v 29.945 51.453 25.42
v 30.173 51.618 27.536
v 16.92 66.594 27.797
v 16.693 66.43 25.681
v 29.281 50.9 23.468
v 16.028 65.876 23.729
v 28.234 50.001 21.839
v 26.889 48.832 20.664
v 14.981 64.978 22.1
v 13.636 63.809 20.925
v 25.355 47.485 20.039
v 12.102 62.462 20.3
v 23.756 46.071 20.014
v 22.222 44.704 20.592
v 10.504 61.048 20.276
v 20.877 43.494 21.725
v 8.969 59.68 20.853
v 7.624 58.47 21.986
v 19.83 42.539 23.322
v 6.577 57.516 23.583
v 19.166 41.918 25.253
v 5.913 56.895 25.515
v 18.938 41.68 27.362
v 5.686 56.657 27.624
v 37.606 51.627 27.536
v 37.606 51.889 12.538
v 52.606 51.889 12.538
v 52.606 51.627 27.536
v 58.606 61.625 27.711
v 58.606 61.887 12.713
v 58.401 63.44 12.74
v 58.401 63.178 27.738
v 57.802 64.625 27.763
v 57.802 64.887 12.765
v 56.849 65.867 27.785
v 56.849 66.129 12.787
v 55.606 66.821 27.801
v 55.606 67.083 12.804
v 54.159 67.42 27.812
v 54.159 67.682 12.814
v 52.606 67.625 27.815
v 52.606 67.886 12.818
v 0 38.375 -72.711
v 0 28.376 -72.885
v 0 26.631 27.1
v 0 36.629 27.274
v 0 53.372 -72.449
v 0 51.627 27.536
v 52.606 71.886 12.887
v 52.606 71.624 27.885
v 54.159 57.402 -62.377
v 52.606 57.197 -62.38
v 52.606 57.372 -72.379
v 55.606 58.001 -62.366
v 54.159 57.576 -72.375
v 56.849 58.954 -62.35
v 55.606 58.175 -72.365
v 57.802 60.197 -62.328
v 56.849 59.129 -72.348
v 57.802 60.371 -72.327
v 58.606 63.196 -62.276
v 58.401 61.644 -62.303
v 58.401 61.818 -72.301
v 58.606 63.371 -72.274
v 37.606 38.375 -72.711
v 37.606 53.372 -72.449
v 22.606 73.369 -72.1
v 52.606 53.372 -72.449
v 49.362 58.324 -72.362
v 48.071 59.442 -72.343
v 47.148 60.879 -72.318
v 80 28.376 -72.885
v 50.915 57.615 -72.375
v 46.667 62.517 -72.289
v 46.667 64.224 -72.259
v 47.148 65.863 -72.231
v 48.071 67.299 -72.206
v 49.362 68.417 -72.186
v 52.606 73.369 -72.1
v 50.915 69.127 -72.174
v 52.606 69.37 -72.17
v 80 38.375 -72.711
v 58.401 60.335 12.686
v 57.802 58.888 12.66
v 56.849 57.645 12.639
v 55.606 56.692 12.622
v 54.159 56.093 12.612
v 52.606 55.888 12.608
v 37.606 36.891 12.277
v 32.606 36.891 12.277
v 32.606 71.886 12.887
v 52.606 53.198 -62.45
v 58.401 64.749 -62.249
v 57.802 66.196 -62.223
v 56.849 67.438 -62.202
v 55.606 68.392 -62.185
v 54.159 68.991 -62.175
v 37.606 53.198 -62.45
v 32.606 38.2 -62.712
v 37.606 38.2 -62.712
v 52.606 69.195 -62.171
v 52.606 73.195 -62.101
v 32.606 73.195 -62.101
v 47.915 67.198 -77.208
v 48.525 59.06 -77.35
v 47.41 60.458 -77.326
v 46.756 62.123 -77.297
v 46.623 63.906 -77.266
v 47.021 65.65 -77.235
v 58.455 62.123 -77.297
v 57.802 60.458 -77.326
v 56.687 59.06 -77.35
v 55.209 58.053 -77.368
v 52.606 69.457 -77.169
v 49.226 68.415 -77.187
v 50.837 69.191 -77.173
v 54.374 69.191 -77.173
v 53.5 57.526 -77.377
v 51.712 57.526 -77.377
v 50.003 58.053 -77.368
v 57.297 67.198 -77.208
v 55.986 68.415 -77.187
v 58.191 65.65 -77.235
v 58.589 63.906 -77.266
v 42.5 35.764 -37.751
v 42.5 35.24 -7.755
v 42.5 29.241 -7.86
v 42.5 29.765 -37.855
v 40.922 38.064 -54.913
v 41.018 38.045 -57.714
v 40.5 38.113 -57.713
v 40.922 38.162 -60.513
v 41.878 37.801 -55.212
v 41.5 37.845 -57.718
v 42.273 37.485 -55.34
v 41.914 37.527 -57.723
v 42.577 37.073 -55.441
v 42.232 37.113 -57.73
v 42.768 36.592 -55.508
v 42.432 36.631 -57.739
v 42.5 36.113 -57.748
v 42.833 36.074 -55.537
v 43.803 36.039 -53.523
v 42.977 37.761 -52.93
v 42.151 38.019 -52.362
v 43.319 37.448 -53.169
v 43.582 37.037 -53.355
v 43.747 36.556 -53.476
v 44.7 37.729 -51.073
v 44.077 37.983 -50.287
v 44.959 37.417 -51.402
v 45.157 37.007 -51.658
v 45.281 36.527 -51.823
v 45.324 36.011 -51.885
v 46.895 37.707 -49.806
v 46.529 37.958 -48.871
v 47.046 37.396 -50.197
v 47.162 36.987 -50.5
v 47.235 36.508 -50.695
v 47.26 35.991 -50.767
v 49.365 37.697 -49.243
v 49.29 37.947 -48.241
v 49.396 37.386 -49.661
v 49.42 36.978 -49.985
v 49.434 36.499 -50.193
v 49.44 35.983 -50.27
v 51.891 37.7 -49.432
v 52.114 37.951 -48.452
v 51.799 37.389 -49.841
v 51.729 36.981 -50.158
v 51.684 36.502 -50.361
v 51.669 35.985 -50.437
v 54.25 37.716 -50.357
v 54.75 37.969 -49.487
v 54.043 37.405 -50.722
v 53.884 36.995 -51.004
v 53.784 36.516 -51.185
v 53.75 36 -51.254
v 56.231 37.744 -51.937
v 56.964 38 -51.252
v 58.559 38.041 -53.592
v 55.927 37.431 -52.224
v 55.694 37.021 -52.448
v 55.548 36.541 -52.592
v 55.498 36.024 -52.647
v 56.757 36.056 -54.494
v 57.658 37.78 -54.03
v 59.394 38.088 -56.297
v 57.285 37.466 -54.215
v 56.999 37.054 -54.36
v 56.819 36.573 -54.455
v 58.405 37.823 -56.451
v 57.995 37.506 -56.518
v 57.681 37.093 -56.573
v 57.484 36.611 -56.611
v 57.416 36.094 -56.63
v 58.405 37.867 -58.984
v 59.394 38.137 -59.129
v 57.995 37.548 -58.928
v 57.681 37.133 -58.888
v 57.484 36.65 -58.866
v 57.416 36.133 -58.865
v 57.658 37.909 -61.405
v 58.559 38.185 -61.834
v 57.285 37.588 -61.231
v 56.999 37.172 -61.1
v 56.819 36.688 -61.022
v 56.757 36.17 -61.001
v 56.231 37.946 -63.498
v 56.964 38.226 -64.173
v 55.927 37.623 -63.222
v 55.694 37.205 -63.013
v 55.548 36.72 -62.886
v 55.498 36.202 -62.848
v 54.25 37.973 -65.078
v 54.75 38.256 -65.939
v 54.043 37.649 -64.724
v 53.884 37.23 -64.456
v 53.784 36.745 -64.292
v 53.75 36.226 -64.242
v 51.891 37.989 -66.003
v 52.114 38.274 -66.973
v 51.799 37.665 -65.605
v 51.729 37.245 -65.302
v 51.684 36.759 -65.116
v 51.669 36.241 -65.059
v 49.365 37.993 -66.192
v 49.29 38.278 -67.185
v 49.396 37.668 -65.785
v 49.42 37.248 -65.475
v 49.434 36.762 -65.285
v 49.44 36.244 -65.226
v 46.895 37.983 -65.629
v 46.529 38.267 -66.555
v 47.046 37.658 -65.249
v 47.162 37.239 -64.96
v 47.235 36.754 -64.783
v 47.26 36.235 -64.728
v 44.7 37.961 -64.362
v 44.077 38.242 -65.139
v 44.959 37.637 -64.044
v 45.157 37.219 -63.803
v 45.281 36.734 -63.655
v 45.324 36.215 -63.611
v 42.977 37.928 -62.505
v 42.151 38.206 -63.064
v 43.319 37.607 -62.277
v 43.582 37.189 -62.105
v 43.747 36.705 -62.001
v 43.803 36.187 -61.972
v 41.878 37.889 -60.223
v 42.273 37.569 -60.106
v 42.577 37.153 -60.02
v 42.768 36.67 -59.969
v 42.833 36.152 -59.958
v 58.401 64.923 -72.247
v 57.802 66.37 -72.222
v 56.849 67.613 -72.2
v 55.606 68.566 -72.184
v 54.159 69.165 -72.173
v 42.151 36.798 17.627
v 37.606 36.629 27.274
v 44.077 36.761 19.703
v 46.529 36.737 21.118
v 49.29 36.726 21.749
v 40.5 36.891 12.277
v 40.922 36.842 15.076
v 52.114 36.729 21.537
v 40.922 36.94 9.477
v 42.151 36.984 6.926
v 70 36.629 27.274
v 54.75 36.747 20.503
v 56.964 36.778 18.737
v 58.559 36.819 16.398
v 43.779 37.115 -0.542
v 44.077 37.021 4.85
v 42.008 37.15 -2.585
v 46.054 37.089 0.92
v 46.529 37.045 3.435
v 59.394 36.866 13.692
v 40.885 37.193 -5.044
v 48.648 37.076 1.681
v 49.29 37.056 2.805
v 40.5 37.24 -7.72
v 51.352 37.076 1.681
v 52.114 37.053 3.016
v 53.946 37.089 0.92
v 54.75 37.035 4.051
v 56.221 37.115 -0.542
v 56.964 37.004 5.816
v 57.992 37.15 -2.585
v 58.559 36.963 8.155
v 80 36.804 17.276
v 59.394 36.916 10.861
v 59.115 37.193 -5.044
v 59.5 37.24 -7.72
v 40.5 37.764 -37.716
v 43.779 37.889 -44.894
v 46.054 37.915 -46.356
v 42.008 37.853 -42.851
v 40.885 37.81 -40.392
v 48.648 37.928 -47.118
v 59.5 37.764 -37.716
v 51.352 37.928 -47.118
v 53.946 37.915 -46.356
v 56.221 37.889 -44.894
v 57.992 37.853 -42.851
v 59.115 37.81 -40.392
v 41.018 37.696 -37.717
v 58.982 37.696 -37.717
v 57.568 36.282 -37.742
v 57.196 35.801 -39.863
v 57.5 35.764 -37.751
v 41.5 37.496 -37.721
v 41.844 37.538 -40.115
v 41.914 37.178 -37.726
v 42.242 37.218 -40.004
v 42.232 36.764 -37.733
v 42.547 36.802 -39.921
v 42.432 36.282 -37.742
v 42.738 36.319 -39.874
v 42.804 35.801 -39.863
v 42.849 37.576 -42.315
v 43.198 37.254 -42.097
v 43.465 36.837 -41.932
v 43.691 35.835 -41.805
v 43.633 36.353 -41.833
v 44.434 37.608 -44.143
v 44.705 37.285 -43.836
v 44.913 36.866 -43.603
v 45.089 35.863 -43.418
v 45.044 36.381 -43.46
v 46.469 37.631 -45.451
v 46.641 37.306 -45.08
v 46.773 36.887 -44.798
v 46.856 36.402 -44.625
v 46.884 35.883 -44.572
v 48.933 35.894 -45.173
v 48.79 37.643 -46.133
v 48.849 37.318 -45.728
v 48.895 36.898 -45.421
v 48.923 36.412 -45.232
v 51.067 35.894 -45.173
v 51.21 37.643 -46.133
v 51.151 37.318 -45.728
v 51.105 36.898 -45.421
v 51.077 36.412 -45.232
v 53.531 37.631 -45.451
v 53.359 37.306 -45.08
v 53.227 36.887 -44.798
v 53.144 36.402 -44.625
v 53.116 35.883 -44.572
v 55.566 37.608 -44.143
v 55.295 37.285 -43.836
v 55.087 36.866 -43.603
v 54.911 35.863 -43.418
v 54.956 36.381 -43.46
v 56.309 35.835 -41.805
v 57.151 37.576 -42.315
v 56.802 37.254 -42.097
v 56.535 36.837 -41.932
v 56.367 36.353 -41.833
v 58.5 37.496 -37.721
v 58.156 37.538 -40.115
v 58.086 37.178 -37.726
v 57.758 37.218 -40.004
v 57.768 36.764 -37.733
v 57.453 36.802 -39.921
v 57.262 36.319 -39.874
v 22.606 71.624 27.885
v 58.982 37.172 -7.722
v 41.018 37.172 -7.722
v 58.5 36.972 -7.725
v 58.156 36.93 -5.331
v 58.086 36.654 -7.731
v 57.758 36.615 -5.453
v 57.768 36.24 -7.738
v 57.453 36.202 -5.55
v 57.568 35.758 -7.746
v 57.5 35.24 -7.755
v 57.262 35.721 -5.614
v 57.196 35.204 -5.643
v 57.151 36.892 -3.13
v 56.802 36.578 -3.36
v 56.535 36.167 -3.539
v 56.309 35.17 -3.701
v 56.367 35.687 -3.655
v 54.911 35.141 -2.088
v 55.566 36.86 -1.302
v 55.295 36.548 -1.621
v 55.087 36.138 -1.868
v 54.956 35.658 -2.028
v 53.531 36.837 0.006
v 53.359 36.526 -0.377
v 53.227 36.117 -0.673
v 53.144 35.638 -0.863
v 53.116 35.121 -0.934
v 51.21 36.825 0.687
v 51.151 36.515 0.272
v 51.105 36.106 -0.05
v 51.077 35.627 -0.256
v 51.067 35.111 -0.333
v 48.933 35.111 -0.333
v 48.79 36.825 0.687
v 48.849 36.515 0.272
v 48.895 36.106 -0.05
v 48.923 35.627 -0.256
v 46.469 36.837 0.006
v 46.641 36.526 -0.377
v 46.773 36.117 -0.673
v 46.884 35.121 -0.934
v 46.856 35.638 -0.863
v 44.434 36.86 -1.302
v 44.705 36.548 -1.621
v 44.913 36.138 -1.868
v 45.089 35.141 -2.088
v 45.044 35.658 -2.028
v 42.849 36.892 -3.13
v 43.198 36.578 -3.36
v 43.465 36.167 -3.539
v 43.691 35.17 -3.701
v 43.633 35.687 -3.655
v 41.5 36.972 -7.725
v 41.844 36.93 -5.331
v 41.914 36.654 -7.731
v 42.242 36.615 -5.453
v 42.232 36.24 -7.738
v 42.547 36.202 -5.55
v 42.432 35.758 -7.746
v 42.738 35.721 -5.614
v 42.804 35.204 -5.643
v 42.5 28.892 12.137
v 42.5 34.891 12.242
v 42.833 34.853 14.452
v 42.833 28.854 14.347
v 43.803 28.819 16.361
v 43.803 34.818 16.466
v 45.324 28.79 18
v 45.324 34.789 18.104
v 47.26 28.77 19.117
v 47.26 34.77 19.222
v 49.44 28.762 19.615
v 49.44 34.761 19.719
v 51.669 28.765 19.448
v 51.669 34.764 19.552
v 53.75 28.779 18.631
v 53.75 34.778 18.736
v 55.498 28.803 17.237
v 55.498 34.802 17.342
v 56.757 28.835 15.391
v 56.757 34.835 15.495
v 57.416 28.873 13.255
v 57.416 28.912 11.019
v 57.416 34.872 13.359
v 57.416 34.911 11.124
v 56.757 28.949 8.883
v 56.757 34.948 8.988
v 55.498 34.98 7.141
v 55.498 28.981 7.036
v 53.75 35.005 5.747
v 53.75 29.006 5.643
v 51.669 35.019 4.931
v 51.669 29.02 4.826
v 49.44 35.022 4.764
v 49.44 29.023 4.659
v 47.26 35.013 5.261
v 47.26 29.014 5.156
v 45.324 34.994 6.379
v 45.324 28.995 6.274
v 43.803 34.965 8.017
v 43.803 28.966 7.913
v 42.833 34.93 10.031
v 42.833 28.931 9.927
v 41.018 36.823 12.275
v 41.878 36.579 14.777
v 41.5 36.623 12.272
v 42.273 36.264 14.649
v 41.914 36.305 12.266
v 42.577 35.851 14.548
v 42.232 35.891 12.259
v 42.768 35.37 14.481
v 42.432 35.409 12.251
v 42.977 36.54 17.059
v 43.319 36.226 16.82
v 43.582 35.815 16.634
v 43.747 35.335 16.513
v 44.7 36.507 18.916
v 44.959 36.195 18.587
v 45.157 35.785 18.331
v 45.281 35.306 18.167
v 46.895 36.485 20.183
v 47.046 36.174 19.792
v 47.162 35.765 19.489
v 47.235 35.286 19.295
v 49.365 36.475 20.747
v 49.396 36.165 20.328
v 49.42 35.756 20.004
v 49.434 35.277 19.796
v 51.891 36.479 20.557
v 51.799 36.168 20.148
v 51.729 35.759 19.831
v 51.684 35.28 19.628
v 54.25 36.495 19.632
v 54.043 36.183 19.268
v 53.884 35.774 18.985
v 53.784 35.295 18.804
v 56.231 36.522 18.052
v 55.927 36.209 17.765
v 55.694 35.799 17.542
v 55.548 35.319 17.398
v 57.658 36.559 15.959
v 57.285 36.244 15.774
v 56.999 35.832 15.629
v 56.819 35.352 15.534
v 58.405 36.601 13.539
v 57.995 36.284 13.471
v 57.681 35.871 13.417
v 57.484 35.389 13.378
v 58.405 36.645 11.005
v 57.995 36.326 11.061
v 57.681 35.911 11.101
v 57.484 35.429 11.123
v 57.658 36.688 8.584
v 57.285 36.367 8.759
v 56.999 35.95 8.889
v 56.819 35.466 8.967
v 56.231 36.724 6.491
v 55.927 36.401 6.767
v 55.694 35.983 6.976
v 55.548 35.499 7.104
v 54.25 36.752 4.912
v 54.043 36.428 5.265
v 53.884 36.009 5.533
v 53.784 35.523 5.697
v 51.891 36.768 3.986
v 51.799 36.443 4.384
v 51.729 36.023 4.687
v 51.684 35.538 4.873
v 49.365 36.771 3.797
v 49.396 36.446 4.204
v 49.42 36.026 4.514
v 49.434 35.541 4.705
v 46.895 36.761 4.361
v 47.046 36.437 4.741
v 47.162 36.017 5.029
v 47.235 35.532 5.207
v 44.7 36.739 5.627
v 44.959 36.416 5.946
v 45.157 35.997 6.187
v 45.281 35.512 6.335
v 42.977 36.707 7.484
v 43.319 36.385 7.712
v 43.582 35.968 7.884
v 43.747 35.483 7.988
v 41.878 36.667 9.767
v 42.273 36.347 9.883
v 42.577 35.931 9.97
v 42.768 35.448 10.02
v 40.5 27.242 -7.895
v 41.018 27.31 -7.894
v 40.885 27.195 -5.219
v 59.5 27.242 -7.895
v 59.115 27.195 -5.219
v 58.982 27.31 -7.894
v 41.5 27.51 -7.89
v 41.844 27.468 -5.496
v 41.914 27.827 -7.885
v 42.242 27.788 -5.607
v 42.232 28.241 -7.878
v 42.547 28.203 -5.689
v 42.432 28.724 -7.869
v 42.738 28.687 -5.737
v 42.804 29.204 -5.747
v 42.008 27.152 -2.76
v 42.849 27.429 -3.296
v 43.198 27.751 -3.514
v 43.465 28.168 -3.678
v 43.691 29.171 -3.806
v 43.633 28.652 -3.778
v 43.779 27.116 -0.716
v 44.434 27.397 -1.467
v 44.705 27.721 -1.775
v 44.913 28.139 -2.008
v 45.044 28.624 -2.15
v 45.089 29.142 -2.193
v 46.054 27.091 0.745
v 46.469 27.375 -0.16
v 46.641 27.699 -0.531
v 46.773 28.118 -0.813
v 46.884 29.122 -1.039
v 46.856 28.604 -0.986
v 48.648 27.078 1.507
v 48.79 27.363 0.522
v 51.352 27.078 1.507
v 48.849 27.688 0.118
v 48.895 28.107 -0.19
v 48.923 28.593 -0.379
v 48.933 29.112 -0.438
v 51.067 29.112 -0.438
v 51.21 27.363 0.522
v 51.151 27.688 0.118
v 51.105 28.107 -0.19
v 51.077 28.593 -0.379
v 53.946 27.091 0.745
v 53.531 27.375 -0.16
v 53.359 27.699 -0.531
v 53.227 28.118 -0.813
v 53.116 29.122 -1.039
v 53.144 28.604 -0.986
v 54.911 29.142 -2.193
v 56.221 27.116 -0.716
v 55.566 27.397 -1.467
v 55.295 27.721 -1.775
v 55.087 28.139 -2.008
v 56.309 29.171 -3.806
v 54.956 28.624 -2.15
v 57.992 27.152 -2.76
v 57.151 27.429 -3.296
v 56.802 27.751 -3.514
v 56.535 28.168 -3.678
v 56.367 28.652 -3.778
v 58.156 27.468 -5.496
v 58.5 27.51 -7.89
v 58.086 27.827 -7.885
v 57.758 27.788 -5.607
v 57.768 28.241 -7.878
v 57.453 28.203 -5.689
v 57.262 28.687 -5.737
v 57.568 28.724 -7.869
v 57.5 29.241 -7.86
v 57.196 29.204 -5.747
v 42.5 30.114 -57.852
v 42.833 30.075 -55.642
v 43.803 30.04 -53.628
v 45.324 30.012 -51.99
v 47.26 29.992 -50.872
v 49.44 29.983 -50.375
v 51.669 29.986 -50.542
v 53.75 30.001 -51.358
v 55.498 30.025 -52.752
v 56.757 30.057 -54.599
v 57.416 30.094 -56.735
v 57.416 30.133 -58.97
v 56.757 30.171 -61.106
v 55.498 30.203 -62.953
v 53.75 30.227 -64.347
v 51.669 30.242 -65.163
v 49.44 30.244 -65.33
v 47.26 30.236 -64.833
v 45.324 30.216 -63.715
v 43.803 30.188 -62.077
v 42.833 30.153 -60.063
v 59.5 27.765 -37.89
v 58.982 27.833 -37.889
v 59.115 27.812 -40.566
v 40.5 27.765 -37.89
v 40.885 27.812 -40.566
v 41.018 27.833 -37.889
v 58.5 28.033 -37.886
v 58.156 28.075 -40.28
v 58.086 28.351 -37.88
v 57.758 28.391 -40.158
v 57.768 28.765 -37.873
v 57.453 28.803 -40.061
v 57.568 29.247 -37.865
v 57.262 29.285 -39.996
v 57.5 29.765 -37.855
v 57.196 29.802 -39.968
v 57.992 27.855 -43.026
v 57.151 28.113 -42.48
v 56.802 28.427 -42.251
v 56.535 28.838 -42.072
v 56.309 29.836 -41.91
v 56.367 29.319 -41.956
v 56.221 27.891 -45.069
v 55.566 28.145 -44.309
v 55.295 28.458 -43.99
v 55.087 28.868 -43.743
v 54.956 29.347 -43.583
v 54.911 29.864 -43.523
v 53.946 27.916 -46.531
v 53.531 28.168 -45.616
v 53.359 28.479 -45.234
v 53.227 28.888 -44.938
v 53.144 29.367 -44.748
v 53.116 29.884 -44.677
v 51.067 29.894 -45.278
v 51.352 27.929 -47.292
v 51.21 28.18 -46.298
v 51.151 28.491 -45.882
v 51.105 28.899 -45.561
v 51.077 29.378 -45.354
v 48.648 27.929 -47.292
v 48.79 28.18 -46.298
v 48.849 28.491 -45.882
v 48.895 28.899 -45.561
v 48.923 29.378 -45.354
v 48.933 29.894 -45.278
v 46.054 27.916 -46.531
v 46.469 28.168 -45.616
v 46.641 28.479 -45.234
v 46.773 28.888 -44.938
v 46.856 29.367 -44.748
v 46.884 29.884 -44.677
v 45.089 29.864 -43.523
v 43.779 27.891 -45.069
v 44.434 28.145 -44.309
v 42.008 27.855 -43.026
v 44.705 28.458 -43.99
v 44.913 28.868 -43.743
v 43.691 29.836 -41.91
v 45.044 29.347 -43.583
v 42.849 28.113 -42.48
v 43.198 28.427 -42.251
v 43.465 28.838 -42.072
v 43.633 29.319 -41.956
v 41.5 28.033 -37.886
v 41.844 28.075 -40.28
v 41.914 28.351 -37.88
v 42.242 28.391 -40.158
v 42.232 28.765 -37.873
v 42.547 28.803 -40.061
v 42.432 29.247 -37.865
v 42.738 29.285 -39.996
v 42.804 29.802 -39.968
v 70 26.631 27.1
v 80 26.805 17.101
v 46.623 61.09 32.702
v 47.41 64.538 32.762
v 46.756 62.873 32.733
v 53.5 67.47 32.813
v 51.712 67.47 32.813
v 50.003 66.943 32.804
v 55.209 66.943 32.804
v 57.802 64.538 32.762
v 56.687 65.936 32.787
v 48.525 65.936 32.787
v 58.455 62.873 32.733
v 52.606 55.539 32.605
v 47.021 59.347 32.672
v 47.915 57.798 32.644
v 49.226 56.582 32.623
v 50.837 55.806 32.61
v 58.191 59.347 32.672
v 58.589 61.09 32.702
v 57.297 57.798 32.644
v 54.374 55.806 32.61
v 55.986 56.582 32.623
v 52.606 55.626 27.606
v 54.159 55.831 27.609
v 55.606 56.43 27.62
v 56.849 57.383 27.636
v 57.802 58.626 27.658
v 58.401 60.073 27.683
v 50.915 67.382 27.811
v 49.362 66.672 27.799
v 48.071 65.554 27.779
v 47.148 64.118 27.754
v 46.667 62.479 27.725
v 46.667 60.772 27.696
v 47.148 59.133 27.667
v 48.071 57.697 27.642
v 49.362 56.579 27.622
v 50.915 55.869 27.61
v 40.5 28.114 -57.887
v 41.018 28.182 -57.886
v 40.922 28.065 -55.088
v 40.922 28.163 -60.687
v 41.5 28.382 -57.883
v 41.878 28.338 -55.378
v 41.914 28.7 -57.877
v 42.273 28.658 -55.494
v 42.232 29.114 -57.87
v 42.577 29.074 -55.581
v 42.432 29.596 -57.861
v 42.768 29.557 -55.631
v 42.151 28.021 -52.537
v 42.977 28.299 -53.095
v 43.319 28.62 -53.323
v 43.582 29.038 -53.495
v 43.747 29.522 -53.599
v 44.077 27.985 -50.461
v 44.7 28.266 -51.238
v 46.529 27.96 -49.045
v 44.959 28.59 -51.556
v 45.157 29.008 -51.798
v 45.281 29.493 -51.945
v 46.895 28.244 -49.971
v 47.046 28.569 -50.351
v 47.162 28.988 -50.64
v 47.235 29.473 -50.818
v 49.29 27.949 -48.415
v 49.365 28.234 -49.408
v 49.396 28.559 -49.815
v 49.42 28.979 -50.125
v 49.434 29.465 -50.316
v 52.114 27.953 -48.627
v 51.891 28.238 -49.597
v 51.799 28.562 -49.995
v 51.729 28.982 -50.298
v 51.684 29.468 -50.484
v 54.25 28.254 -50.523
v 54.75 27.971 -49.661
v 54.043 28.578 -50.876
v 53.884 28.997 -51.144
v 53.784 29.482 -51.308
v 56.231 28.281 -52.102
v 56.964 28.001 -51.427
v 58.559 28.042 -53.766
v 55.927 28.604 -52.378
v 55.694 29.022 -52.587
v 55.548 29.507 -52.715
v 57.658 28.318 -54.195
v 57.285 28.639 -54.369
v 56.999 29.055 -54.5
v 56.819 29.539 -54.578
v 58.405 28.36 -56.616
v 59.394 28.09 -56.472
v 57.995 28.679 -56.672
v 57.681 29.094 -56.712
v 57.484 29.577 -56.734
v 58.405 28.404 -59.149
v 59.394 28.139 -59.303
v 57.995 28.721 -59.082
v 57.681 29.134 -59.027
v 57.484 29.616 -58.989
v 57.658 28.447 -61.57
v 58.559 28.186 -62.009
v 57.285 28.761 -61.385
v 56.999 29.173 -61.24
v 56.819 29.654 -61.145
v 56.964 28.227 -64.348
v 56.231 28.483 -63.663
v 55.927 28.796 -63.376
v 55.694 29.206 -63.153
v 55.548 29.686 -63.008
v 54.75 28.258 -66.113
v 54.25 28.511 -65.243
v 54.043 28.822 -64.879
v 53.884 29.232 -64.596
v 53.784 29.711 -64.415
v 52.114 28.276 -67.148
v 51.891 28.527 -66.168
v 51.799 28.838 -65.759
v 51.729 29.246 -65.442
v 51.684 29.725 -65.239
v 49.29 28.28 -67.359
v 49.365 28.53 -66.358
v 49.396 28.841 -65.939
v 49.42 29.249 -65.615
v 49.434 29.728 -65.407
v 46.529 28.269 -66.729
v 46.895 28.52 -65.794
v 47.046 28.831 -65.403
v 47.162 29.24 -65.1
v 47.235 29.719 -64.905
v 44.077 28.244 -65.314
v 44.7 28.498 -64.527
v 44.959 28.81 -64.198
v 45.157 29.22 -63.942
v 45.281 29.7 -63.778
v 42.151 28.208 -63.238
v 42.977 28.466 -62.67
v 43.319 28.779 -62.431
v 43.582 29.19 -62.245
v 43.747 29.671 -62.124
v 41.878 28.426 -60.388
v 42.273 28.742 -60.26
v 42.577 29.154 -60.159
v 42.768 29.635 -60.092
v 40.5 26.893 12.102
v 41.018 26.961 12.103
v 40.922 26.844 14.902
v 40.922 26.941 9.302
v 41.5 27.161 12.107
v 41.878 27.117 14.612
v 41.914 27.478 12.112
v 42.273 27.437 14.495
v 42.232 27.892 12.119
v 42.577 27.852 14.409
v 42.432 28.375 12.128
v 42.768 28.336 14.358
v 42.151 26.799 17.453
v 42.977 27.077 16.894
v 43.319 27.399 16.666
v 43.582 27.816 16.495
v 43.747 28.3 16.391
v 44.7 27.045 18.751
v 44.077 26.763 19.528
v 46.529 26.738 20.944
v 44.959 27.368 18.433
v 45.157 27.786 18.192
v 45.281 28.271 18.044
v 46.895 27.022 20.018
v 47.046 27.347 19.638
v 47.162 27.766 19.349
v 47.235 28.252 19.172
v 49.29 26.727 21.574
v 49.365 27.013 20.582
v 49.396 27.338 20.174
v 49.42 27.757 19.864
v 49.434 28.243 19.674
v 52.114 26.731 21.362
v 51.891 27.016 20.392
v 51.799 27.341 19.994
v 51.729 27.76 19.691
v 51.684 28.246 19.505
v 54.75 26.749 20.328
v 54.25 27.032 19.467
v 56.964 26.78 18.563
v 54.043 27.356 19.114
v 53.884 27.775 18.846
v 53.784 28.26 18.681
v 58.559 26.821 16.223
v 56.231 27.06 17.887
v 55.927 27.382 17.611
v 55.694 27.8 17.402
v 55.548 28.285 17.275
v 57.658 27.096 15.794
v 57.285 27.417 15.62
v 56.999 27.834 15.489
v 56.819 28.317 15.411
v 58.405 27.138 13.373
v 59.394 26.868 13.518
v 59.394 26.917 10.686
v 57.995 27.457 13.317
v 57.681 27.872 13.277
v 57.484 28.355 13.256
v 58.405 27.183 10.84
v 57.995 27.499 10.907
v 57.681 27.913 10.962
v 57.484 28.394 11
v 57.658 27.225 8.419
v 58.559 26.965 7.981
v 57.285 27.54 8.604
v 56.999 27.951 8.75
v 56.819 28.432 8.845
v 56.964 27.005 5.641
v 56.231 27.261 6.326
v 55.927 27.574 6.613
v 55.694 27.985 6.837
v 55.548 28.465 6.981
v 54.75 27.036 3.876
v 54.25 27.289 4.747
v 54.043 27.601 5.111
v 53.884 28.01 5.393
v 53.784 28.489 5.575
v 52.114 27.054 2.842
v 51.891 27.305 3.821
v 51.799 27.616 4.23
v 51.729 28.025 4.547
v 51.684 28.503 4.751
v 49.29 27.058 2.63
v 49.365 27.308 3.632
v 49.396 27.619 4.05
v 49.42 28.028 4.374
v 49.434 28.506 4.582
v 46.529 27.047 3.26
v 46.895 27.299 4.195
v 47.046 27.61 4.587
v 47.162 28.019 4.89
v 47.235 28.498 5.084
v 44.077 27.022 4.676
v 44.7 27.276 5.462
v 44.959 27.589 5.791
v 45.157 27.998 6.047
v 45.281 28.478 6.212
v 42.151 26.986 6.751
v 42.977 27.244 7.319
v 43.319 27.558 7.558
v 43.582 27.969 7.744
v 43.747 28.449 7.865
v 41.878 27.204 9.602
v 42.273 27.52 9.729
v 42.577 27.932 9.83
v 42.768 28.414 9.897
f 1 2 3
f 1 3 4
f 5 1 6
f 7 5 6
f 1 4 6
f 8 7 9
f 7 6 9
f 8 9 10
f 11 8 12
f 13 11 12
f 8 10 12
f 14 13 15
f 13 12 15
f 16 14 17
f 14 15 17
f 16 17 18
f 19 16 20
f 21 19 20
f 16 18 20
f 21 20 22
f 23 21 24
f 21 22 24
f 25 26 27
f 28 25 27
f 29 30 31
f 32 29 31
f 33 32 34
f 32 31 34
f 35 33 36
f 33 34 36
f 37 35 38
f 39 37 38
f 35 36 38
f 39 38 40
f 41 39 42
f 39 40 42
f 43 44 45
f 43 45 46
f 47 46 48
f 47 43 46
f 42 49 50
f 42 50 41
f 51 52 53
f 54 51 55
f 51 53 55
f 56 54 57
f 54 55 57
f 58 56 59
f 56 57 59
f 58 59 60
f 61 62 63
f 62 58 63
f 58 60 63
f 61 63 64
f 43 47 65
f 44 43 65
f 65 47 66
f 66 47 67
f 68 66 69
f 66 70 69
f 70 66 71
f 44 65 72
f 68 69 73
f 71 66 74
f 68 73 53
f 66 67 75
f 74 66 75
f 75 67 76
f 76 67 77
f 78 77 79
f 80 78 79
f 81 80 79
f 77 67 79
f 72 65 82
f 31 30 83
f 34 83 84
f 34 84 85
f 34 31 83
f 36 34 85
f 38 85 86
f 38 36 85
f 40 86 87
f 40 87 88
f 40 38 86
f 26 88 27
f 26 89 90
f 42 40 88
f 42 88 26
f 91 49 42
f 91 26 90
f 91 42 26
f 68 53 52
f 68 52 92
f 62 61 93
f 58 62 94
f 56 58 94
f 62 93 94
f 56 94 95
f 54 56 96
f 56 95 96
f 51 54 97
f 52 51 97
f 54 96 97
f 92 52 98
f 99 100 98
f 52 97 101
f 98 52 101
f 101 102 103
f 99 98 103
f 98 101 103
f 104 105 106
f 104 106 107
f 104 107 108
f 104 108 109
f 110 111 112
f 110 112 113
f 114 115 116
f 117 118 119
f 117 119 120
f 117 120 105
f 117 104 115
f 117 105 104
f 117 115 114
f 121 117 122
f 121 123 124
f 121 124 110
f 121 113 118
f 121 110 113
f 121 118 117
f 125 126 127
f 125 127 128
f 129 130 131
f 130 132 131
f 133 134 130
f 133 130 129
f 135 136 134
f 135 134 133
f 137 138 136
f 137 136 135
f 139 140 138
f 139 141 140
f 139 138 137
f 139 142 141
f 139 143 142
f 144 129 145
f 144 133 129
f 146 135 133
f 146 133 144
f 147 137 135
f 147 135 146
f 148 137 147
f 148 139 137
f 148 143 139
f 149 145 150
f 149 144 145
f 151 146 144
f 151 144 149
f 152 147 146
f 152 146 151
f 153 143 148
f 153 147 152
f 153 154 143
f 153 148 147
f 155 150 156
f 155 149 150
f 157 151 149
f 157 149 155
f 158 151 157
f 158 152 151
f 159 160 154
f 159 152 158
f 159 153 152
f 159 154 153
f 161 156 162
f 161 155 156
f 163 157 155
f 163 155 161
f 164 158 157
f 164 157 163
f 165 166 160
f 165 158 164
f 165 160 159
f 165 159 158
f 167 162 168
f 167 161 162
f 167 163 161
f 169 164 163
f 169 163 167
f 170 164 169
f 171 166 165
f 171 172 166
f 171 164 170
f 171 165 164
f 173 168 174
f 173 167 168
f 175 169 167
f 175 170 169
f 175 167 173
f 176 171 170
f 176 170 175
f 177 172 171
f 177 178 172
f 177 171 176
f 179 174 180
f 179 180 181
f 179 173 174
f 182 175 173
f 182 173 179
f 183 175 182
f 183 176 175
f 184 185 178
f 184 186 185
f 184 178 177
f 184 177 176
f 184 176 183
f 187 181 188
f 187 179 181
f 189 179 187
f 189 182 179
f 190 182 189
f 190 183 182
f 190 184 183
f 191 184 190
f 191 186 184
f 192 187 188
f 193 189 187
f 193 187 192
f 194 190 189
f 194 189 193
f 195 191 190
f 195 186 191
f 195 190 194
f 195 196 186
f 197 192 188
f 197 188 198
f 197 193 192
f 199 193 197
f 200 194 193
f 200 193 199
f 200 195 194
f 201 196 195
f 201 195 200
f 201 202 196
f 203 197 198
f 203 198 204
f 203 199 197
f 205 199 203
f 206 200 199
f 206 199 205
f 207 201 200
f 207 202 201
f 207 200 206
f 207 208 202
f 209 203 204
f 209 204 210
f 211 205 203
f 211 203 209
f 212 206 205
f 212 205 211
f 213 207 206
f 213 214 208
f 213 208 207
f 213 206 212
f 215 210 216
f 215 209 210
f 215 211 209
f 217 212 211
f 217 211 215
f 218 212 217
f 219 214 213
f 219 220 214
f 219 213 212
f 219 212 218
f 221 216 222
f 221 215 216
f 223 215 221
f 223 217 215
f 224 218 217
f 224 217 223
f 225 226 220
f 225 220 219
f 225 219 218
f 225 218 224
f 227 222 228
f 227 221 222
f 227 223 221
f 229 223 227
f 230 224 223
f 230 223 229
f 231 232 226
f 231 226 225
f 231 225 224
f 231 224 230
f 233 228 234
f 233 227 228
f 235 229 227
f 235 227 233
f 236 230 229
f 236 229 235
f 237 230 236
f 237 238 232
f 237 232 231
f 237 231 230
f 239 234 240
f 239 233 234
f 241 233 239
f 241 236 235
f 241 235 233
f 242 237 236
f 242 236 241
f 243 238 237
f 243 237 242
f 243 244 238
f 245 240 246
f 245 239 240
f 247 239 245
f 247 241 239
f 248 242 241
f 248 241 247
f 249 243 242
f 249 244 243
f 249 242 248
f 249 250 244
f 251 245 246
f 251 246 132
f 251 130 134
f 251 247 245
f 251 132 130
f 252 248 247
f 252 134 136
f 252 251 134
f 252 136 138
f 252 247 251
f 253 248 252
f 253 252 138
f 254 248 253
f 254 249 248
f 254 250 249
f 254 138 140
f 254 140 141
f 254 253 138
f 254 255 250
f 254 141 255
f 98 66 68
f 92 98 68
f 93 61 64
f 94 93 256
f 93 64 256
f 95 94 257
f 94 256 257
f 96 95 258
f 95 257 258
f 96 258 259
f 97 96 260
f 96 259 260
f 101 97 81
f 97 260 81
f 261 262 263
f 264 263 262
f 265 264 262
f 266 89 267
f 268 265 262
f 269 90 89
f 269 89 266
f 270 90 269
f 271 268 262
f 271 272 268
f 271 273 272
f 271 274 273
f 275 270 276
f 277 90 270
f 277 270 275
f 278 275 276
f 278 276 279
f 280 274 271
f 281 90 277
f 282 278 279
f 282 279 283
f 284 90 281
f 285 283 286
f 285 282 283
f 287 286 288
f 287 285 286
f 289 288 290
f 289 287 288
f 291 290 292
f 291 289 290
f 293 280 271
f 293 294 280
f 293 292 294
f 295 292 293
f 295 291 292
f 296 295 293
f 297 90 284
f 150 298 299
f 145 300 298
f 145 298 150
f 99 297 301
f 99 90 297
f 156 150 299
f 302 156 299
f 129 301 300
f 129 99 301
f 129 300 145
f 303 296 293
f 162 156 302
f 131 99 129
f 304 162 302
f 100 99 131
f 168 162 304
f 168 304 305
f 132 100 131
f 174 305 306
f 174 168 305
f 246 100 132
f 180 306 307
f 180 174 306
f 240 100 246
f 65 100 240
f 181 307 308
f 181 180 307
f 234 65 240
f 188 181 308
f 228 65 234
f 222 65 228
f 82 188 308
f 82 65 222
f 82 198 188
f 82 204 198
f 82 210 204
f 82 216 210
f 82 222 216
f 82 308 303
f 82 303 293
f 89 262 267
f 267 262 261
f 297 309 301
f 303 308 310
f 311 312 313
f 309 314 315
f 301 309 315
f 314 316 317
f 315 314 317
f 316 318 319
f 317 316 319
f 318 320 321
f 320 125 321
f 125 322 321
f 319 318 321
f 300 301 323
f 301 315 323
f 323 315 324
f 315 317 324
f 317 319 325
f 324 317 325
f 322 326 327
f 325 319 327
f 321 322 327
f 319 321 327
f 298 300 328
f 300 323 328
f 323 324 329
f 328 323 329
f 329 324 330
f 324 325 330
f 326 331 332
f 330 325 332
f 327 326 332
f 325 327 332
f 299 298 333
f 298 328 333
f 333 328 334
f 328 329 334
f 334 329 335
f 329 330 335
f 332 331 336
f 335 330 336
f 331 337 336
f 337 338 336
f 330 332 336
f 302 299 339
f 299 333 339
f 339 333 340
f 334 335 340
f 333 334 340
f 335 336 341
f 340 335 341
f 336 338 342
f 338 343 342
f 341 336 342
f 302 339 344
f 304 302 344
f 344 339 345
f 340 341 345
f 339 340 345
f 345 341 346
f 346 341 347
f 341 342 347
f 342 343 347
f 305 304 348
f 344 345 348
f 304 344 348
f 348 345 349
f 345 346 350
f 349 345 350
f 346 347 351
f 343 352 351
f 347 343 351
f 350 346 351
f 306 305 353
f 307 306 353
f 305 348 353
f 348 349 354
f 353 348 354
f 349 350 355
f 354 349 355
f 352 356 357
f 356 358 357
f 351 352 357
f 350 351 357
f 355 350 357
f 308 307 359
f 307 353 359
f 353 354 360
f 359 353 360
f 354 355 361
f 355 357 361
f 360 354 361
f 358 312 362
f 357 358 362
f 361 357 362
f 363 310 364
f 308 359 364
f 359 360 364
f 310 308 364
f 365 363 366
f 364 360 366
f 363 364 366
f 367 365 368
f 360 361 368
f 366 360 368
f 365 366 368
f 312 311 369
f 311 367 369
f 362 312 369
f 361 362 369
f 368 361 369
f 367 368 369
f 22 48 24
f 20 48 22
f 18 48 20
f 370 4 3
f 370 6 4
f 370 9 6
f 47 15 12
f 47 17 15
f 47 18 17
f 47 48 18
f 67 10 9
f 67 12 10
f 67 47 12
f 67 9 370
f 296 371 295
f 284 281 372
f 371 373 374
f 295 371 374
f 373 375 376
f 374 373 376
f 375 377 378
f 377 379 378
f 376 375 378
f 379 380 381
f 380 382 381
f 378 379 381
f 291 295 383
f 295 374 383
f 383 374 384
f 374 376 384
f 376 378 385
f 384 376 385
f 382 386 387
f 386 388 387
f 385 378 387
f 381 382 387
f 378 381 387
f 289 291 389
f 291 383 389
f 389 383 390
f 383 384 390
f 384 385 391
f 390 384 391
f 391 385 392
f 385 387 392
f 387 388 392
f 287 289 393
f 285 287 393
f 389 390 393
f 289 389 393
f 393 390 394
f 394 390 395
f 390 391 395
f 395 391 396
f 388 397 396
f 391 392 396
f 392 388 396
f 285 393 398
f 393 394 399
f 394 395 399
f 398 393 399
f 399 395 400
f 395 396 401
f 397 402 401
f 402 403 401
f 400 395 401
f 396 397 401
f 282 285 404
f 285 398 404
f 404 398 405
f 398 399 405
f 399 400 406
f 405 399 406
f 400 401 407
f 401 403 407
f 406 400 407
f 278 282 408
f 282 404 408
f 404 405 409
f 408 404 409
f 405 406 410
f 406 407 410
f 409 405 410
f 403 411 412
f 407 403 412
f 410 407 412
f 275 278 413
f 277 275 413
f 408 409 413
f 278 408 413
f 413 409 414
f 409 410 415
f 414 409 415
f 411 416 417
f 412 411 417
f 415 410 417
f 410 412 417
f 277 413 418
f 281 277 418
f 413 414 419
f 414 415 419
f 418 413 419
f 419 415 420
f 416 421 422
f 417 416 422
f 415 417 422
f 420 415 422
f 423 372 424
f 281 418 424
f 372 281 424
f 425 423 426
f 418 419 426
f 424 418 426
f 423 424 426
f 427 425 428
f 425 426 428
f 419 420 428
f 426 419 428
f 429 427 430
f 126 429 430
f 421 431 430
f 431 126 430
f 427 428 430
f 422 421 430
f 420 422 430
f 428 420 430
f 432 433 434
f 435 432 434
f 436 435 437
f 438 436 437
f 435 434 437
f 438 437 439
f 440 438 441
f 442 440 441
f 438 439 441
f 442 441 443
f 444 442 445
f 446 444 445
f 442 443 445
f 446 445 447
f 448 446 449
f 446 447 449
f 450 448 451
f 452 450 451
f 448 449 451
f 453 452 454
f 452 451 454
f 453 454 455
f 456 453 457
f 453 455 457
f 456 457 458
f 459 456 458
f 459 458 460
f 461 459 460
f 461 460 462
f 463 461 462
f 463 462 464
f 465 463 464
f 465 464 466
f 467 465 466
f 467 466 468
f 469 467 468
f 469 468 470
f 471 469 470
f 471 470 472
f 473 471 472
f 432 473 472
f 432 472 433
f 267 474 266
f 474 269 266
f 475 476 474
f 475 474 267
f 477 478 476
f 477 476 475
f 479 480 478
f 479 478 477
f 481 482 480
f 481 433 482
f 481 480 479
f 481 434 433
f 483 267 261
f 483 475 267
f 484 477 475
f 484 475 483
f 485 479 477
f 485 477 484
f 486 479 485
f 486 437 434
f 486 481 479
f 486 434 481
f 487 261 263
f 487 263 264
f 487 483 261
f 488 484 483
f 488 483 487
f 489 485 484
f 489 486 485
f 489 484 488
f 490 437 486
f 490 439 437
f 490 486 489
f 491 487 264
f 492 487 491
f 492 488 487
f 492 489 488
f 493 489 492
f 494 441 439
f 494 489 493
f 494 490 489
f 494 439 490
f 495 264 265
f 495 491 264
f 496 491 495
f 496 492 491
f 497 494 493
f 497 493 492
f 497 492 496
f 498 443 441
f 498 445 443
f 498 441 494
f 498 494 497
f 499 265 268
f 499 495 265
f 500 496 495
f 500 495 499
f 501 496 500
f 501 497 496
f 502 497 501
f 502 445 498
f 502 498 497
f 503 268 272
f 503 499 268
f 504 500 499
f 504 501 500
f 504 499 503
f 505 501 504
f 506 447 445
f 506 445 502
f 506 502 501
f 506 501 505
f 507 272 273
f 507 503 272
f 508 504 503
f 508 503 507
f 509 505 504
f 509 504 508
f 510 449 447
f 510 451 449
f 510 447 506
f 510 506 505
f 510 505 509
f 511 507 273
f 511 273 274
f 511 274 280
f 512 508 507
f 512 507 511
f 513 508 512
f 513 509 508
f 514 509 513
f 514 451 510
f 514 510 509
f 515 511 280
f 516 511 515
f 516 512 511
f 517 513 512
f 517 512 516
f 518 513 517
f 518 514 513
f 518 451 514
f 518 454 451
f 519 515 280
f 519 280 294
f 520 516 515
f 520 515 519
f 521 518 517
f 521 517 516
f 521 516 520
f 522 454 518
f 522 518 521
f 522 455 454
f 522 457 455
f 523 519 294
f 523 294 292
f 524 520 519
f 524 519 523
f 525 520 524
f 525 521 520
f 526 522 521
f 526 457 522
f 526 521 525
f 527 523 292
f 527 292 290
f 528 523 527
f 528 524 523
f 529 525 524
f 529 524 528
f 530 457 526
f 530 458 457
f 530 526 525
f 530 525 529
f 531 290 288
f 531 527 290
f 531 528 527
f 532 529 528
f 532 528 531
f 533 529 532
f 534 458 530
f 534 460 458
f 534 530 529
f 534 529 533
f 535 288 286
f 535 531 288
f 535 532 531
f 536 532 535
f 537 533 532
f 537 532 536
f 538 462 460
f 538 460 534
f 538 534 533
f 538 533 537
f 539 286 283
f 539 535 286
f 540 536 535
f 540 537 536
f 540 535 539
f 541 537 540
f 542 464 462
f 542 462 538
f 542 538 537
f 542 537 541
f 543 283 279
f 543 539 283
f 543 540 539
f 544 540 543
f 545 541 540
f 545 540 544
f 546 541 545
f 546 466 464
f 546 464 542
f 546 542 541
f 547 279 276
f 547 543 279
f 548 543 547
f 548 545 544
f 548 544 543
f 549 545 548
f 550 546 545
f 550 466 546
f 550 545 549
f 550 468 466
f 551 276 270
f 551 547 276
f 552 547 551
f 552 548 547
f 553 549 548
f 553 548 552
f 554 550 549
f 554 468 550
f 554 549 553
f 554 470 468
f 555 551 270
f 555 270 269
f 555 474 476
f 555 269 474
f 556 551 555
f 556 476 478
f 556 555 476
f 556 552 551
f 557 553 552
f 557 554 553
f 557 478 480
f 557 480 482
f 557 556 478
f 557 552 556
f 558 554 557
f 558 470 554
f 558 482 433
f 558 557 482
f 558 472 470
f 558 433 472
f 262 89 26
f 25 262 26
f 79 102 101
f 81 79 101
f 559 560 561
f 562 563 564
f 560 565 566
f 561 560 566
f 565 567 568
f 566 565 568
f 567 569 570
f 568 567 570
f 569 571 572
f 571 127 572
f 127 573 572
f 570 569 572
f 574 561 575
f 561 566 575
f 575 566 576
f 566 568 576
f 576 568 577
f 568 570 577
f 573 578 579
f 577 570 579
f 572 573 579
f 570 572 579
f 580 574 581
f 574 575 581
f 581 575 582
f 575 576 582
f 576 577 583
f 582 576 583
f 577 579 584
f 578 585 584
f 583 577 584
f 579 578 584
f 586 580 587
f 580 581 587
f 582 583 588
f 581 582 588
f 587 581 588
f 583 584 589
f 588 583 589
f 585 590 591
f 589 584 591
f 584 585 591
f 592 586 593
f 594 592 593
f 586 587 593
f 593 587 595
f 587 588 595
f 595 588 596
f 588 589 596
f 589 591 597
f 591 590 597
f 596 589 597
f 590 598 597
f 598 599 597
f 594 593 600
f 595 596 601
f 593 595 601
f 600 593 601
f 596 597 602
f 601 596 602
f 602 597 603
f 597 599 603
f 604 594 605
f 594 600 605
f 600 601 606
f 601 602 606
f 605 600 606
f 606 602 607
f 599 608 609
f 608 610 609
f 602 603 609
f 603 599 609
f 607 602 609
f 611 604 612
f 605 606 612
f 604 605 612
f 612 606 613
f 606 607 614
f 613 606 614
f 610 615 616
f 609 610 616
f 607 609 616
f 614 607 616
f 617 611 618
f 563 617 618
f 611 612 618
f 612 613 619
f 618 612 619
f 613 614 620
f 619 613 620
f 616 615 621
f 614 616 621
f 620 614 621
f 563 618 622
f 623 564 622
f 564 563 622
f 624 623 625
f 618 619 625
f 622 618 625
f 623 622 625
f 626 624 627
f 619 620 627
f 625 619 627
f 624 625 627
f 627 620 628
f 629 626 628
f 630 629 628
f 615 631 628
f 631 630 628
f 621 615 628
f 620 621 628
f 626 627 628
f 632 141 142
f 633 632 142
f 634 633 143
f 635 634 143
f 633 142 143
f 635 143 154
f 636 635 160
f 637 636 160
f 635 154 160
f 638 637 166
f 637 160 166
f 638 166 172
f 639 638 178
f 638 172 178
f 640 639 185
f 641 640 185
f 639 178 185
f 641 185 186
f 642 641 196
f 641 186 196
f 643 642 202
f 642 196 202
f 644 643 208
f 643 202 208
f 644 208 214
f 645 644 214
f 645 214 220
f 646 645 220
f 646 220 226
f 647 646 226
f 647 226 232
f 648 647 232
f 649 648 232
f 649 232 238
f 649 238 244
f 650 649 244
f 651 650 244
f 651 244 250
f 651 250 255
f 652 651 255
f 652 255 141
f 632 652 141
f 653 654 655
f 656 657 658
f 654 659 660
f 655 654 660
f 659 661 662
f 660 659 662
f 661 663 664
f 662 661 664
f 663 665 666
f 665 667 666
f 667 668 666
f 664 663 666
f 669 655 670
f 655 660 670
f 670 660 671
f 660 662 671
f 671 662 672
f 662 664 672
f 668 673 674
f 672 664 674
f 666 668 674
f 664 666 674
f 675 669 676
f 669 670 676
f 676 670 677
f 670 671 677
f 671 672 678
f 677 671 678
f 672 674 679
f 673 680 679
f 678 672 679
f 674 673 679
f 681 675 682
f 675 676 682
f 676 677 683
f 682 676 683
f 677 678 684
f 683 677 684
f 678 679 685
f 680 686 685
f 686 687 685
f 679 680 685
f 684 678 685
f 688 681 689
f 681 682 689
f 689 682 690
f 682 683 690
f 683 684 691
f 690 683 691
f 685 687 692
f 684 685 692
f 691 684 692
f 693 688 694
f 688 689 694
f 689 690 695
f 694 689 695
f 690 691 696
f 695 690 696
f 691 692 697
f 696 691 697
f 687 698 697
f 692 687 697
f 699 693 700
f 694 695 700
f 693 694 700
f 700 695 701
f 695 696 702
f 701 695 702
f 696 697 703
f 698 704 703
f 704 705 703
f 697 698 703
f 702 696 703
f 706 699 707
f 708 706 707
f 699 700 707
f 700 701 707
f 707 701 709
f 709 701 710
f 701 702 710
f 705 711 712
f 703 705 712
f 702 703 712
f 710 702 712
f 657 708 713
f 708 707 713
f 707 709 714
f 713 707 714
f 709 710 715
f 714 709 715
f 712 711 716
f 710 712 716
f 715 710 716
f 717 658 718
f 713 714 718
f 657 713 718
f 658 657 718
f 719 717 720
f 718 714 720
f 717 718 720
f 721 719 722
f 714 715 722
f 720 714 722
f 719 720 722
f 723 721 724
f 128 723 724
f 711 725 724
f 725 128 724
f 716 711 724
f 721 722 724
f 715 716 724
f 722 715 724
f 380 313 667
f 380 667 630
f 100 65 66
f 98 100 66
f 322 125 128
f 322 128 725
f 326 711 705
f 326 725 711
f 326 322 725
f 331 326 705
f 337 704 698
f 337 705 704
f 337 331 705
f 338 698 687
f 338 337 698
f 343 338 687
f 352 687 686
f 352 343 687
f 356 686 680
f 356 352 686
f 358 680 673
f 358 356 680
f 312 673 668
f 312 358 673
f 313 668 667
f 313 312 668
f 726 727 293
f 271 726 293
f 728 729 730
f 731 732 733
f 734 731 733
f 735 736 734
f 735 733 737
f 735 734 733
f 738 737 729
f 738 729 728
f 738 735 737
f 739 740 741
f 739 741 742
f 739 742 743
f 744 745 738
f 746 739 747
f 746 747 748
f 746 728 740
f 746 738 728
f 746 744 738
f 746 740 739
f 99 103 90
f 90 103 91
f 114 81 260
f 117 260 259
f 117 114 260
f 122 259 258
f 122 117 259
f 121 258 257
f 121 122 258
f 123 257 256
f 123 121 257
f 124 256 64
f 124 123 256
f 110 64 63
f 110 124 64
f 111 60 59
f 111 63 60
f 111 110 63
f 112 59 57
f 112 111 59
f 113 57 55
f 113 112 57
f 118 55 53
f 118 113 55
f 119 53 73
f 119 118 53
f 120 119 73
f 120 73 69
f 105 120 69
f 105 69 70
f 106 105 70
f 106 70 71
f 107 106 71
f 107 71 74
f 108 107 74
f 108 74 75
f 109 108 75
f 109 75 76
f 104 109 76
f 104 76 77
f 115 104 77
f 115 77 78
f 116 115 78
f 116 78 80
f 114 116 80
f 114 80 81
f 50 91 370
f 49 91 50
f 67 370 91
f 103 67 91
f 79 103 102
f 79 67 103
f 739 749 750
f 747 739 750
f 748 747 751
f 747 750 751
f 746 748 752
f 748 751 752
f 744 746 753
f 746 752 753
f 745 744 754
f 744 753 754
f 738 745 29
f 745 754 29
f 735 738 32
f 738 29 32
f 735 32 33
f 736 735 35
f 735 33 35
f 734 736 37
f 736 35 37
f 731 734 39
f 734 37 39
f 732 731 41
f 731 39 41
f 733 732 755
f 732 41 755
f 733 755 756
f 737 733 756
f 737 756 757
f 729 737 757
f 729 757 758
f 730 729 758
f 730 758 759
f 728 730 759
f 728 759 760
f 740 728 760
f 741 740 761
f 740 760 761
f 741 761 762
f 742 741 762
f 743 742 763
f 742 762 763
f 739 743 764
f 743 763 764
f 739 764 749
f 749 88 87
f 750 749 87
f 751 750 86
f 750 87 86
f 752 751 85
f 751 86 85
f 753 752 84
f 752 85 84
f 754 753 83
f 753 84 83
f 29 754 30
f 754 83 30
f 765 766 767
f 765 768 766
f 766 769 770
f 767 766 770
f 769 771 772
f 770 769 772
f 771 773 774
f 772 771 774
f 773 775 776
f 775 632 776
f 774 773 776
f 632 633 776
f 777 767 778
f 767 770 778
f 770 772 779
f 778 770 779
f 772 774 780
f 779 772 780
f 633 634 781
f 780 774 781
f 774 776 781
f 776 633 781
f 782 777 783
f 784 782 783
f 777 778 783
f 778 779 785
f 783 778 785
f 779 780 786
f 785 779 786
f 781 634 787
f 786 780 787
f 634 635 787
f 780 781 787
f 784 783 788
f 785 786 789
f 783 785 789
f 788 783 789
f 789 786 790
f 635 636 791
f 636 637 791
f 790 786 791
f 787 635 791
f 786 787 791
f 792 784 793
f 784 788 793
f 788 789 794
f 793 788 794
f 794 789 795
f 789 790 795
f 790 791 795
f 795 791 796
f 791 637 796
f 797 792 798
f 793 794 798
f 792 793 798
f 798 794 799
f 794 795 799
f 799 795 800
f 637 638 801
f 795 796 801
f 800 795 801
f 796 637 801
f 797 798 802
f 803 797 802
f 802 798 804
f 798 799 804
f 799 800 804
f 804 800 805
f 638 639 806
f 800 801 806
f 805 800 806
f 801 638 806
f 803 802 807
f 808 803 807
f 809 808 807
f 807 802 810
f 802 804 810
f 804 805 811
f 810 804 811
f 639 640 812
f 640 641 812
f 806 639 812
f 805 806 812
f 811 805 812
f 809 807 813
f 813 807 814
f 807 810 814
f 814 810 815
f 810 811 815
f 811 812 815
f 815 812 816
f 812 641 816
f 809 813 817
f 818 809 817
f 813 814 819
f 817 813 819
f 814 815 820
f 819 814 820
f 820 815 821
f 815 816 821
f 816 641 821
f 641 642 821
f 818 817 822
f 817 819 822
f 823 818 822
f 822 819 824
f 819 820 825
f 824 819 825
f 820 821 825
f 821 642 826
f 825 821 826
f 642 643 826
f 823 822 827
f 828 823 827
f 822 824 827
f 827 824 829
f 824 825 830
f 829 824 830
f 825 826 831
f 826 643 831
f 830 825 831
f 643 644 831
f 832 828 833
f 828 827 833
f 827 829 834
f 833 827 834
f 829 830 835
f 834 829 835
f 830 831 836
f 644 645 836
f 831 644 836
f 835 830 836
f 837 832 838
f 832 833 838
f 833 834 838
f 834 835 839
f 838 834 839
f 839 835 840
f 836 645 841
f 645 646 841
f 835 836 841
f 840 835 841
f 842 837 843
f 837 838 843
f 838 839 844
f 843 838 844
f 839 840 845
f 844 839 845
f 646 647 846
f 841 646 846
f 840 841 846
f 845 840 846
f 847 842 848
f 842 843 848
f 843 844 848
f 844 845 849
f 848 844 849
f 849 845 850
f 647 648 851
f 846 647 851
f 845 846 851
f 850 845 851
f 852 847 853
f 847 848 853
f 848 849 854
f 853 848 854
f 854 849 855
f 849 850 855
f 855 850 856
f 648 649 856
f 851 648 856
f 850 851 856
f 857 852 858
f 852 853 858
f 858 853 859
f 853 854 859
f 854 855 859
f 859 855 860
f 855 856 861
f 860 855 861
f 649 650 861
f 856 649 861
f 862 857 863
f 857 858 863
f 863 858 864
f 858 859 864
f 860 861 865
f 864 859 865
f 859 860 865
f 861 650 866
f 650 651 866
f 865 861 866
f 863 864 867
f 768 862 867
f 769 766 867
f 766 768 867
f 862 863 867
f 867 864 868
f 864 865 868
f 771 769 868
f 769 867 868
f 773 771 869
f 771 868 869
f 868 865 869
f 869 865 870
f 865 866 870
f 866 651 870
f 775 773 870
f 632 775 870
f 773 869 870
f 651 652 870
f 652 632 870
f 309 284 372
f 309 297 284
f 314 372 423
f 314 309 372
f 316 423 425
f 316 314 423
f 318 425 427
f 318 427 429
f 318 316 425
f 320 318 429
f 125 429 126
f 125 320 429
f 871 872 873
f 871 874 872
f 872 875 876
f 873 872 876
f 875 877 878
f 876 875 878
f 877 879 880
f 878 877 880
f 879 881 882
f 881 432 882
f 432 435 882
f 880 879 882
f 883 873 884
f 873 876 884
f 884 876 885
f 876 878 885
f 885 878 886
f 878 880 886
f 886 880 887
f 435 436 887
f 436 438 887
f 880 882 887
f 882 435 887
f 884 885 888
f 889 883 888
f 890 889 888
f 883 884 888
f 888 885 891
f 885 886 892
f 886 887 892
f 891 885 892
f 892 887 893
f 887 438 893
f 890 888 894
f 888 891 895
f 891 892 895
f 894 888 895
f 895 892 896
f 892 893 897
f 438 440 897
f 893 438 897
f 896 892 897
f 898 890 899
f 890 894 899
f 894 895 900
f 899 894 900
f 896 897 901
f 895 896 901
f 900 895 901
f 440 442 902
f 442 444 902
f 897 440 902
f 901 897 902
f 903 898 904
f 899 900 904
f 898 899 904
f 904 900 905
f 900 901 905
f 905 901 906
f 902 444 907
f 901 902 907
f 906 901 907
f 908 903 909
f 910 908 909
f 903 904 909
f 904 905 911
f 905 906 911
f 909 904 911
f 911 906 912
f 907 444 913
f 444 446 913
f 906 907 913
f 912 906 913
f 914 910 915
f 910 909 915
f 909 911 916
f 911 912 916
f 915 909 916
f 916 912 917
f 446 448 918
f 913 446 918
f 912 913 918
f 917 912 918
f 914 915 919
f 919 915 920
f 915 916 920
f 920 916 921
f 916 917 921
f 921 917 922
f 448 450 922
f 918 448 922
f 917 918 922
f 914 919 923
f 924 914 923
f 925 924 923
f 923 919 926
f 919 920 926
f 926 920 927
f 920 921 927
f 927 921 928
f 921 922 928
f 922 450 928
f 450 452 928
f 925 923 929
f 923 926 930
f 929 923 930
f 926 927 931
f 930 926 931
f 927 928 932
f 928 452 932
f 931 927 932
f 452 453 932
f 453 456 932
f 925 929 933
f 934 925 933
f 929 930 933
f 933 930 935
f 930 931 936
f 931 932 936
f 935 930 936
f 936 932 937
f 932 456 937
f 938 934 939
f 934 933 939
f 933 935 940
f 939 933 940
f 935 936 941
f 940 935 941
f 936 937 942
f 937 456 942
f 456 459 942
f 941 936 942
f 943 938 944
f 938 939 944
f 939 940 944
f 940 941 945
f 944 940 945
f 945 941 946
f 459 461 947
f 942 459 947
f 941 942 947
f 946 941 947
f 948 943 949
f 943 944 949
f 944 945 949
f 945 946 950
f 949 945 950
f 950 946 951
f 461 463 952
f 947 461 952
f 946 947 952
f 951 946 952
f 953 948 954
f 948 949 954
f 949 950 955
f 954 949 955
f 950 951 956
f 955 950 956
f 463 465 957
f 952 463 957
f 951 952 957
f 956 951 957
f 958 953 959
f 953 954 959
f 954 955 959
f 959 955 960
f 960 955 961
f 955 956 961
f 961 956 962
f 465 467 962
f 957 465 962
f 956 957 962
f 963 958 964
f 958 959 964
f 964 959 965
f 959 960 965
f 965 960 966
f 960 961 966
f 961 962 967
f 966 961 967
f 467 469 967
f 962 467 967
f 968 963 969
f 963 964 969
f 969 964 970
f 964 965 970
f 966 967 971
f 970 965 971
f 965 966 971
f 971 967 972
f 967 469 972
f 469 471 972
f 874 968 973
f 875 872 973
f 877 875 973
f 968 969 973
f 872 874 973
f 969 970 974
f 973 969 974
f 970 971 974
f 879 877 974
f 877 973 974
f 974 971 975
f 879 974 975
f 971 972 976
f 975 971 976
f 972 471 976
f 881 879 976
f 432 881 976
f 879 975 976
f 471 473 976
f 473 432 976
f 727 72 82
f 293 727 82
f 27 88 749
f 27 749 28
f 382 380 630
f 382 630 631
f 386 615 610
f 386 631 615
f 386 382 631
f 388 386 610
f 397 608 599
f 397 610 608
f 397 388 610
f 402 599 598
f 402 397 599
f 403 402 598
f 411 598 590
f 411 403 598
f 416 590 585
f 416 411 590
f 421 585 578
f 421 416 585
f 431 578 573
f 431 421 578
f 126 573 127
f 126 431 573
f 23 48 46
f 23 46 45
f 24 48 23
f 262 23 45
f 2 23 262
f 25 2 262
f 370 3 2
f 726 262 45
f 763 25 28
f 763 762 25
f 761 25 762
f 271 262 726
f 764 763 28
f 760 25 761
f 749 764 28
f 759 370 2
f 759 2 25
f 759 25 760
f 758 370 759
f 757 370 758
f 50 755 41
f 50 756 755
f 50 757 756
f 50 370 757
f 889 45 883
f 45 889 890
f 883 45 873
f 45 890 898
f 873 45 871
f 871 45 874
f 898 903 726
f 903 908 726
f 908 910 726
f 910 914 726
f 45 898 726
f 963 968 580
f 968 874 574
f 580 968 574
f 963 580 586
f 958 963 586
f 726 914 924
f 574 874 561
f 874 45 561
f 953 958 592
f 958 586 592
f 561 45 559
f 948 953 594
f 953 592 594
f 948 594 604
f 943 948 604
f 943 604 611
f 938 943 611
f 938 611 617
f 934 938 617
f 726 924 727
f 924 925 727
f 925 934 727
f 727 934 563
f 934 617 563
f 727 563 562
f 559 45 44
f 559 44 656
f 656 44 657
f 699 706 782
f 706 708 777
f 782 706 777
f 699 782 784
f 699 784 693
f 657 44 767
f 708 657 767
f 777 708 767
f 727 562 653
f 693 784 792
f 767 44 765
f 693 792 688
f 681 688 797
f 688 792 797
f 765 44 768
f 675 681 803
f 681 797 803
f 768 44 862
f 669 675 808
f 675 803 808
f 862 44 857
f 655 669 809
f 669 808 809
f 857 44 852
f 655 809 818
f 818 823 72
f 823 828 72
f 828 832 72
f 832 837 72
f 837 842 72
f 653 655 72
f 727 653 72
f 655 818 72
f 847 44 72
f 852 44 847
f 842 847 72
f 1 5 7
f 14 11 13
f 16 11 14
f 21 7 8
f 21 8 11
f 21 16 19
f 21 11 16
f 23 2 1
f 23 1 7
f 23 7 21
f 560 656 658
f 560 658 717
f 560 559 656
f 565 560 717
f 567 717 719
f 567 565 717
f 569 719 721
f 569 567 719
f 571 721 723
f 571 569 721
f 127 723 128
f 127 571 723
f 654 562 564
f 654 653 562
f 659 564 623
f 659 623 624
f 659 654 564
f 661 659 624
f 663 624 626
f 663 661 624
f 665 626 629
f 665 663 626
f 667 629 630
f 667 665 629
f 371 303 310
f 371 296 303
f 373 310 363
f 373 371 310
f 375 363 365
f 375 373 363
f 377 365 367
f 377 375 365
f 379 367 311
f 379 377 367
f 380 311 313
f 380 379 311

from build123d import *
from build123d.topology import SkipClean

# Parameters (mm, degrees)
SKETCH2_R             = 6
SKETCH2_W             = 37.605887727
SKETCH2_H             = 15
SKETCH2_W_2           = 80
SKETCH2_H_2           = 10
BOSS_EXTRUDE1_DEPTH   = 100
CHAMFER1_SIZE         = 10
CUT_EXTRUDE1_REACH    = 137.739
SKETCH3_W             = 26
SKETCH3_H             = 75
SKETCH4_R             = 6
BOSS_EXTRUDE2_DEPTH   = 5
BOSS_EXTRUDE3_START   = 5
SKETCH5_R             = 6
BOSS_EXTRUDE3_DEPTH   = 5
SKETCH6_R             = 7.5
CUT_EXTRUDE2_DEPTH    = 20
SKETCH7_R             = 7.5
CUT_EXTRUDE3_DEPTH    = 137.565002837
FILLET1_R             = 2
BODY_MOVE_COPY1_ANGLE = 91


with BuildPart() as part:
    # Sketch2 → Boss-Extrude1 (new body)
    with BuildSketch(Plane(origin=(0, 0, 0), x_dir=(1, 0, 0), z_dir=(0, 1, 0))):
        with BuildLine():
            ThreePointArc((58.605887727, 35), (56.848528414, 39.242640687), (52.605887727, 41))
            Line((52.605887727, 41), (52.605887727, 29))
            ThreePointArc((52.605887727, 29), (56.848528414, 30.757359313), (58.605887727, 35))
        make_face()
        with BuildLine():
            Line((52.605887727, 29), (52.605887727, 41))
            ThreePointArc((52.605887727, 41), (46.605887727, 35), (52.605887727, 29))
        make_face()
        with Locations((52.605887727, 35)):
            Circle(SKETCH2_R)
        Polygon((52.605887727, 45), (52.605887727, 25), (37.605887727, 25), (0, 25), (22.605887727, 45), align=None)
        with Locations((18.802943864, 17.5)):
            Rectangle(SKETCH2_W, SKETCH2_H)
        with Locations((40, 5)):
            Rectangle(SKETCH2_W_2, SKETCH2_H_2)
    extrude(amount=BOSS_EXTRUDE1_DEPTH)

    # Chamfer1
    chamfer1_edges = [part.edges().sort_by_distance(p)[0] for p in [
        (80, 100, -5),
    ]]
    chamfer(chamfer1_edges, length=CHAMFER1_SIZE)

    # Cut-Extrude1: up to this face of the body (flat: up to its plane)
    cut_extrude1_end = Plane(part.part.faces().sort_by_distance((58.589742988, 49.443040273, -10))[0])
    # Sketch3 → Cut-Extrude1 (cut, up to the picked face)
    with BuildSketch(Plane(origin=(0, 0, -45), x_dir=(-1, 0, 0), z_dir=(0, 0, -1)), mode=Mode.PRIVATE) as cut_extrude1_sk1:
        with Locations((-45.605887727, 47.5)):
            Rectangle(SKETCH3_W, SKETCH3_H)
    cut_extrude1_tool1 = split(extrude(cut_extrude1_sk1.sketch, amount=-CUT_EXTRUDE1_REACH, mode=Mode.PRIVATE), bisect_by=cut_extrude1_end, keep=Keep.BOTH, mode=Mode.PRIVATE)
    add(cut_extrude1_tool1.solids().sort_by(Axis((45.605888, 47.5, -45), (0, 0, 1)))[0], mode=Mode.SUBTRACT)

    # Sketch4 → Boss-Extrude2 (add)
    with BuildSketch(Plane(origin=(0, 100, 0), x_dir=(1, 0, 0), z_dir=(0, 1, 0))):
        with Locations(Location((52.605887727, 35, 0), (0, 0, 270))):
            Circle(SKETCH4_R)
    extrude(amount=BOSS_EXTRUDE2_DEPTH)

    # Sketch5 → Boss-Extrude3 (add)
    with BuildSketch(Plane(origin=(0, 0, 0), x_dir=(-1, 0, 0), z_dir=(0, -1, 0)).offset(BOSS_EXTRUDE3_START)):
        with Locations(Location((-52.605887727, 35, 0), (0, 0, 90))):
            Circle(SKETCH5_R)
    extrude(amount=-BOSS_EXTRUDE3_DEPTH)

    # Sketch6 → Cut-Extrude2 (cut)
    with BuildSketch(Plane(origin=(-12.406826896, 0, -14.023366793), x_dir=(-0.7489557207890034, 0, 0.6626200482157362), z_dir=(-0.6626200482157362, 0, -0.7489557207890034))):
        with Locations((-31.657106156, 100)):
            Circle(SKETCH6_R)
    extrude(amount=-CUT_EXTRUDE2_DEPTH, mode=Mode.SUBTRACT)

    # Sketch7 → Cut-Extrude3 (cut, through all)
    with SkipClean():  # the faces are left unmerged after this step: merging them gives an invalid solid
        with BuildSketch(Plane(origin=(0, 0, -10), x_dir=(-1, 0, 0), z_dir=(0, 0, -1))):
            with Locations((-50, 85)):
                Circle(SKETCH7_R)
            with Locations((-50, 15)):
                Circle(SKETCH7_R)
            with BuildLine():
                Line((-57.5, 35), (-57.5, 65))
                ThreePointArc((-57.5, 65), (-50, 72.5), (-42.5, 65))
                Line((-42.5, 65), (-42.5, 35))
                ThreePointArc((-42.5, 35), (-50, 27.5), (-57.5, 35))
            make_face()
        extrude(amount=-CUT_EXTRUDE3_DEPTH, mode=Mode.SUBTRACT)

    # Fillet1
    fillet1_edges = [part.edges().sort_by_distance(p)[0] for p in [
        (57.5, 85, 0),
        (57.5, 85, -10),
        (57.5, 15, 0),
        (57.5, 15, -10),
        (50, 27.5, 0),
        (57.5, 50, 0),
        (50, 72.5, 0),
        (42.5, 50, 0),
        (50, 27.5, -10),
        (42.5, 50, -10),
        (50, 72.5, -10),
        (57.5, 50, -10),
    ]]
    fillet(fillet1_edges, radius=FILLET1_R)


with BuildPart() as part_1:
    # Body-Move/Copy1: moved
    add(part.part.rotate(Axis((0, 50, -22.5), (1, 0, 0)), BODY_MOVE_COPY1_ANGLE))


solid = part_1.part
